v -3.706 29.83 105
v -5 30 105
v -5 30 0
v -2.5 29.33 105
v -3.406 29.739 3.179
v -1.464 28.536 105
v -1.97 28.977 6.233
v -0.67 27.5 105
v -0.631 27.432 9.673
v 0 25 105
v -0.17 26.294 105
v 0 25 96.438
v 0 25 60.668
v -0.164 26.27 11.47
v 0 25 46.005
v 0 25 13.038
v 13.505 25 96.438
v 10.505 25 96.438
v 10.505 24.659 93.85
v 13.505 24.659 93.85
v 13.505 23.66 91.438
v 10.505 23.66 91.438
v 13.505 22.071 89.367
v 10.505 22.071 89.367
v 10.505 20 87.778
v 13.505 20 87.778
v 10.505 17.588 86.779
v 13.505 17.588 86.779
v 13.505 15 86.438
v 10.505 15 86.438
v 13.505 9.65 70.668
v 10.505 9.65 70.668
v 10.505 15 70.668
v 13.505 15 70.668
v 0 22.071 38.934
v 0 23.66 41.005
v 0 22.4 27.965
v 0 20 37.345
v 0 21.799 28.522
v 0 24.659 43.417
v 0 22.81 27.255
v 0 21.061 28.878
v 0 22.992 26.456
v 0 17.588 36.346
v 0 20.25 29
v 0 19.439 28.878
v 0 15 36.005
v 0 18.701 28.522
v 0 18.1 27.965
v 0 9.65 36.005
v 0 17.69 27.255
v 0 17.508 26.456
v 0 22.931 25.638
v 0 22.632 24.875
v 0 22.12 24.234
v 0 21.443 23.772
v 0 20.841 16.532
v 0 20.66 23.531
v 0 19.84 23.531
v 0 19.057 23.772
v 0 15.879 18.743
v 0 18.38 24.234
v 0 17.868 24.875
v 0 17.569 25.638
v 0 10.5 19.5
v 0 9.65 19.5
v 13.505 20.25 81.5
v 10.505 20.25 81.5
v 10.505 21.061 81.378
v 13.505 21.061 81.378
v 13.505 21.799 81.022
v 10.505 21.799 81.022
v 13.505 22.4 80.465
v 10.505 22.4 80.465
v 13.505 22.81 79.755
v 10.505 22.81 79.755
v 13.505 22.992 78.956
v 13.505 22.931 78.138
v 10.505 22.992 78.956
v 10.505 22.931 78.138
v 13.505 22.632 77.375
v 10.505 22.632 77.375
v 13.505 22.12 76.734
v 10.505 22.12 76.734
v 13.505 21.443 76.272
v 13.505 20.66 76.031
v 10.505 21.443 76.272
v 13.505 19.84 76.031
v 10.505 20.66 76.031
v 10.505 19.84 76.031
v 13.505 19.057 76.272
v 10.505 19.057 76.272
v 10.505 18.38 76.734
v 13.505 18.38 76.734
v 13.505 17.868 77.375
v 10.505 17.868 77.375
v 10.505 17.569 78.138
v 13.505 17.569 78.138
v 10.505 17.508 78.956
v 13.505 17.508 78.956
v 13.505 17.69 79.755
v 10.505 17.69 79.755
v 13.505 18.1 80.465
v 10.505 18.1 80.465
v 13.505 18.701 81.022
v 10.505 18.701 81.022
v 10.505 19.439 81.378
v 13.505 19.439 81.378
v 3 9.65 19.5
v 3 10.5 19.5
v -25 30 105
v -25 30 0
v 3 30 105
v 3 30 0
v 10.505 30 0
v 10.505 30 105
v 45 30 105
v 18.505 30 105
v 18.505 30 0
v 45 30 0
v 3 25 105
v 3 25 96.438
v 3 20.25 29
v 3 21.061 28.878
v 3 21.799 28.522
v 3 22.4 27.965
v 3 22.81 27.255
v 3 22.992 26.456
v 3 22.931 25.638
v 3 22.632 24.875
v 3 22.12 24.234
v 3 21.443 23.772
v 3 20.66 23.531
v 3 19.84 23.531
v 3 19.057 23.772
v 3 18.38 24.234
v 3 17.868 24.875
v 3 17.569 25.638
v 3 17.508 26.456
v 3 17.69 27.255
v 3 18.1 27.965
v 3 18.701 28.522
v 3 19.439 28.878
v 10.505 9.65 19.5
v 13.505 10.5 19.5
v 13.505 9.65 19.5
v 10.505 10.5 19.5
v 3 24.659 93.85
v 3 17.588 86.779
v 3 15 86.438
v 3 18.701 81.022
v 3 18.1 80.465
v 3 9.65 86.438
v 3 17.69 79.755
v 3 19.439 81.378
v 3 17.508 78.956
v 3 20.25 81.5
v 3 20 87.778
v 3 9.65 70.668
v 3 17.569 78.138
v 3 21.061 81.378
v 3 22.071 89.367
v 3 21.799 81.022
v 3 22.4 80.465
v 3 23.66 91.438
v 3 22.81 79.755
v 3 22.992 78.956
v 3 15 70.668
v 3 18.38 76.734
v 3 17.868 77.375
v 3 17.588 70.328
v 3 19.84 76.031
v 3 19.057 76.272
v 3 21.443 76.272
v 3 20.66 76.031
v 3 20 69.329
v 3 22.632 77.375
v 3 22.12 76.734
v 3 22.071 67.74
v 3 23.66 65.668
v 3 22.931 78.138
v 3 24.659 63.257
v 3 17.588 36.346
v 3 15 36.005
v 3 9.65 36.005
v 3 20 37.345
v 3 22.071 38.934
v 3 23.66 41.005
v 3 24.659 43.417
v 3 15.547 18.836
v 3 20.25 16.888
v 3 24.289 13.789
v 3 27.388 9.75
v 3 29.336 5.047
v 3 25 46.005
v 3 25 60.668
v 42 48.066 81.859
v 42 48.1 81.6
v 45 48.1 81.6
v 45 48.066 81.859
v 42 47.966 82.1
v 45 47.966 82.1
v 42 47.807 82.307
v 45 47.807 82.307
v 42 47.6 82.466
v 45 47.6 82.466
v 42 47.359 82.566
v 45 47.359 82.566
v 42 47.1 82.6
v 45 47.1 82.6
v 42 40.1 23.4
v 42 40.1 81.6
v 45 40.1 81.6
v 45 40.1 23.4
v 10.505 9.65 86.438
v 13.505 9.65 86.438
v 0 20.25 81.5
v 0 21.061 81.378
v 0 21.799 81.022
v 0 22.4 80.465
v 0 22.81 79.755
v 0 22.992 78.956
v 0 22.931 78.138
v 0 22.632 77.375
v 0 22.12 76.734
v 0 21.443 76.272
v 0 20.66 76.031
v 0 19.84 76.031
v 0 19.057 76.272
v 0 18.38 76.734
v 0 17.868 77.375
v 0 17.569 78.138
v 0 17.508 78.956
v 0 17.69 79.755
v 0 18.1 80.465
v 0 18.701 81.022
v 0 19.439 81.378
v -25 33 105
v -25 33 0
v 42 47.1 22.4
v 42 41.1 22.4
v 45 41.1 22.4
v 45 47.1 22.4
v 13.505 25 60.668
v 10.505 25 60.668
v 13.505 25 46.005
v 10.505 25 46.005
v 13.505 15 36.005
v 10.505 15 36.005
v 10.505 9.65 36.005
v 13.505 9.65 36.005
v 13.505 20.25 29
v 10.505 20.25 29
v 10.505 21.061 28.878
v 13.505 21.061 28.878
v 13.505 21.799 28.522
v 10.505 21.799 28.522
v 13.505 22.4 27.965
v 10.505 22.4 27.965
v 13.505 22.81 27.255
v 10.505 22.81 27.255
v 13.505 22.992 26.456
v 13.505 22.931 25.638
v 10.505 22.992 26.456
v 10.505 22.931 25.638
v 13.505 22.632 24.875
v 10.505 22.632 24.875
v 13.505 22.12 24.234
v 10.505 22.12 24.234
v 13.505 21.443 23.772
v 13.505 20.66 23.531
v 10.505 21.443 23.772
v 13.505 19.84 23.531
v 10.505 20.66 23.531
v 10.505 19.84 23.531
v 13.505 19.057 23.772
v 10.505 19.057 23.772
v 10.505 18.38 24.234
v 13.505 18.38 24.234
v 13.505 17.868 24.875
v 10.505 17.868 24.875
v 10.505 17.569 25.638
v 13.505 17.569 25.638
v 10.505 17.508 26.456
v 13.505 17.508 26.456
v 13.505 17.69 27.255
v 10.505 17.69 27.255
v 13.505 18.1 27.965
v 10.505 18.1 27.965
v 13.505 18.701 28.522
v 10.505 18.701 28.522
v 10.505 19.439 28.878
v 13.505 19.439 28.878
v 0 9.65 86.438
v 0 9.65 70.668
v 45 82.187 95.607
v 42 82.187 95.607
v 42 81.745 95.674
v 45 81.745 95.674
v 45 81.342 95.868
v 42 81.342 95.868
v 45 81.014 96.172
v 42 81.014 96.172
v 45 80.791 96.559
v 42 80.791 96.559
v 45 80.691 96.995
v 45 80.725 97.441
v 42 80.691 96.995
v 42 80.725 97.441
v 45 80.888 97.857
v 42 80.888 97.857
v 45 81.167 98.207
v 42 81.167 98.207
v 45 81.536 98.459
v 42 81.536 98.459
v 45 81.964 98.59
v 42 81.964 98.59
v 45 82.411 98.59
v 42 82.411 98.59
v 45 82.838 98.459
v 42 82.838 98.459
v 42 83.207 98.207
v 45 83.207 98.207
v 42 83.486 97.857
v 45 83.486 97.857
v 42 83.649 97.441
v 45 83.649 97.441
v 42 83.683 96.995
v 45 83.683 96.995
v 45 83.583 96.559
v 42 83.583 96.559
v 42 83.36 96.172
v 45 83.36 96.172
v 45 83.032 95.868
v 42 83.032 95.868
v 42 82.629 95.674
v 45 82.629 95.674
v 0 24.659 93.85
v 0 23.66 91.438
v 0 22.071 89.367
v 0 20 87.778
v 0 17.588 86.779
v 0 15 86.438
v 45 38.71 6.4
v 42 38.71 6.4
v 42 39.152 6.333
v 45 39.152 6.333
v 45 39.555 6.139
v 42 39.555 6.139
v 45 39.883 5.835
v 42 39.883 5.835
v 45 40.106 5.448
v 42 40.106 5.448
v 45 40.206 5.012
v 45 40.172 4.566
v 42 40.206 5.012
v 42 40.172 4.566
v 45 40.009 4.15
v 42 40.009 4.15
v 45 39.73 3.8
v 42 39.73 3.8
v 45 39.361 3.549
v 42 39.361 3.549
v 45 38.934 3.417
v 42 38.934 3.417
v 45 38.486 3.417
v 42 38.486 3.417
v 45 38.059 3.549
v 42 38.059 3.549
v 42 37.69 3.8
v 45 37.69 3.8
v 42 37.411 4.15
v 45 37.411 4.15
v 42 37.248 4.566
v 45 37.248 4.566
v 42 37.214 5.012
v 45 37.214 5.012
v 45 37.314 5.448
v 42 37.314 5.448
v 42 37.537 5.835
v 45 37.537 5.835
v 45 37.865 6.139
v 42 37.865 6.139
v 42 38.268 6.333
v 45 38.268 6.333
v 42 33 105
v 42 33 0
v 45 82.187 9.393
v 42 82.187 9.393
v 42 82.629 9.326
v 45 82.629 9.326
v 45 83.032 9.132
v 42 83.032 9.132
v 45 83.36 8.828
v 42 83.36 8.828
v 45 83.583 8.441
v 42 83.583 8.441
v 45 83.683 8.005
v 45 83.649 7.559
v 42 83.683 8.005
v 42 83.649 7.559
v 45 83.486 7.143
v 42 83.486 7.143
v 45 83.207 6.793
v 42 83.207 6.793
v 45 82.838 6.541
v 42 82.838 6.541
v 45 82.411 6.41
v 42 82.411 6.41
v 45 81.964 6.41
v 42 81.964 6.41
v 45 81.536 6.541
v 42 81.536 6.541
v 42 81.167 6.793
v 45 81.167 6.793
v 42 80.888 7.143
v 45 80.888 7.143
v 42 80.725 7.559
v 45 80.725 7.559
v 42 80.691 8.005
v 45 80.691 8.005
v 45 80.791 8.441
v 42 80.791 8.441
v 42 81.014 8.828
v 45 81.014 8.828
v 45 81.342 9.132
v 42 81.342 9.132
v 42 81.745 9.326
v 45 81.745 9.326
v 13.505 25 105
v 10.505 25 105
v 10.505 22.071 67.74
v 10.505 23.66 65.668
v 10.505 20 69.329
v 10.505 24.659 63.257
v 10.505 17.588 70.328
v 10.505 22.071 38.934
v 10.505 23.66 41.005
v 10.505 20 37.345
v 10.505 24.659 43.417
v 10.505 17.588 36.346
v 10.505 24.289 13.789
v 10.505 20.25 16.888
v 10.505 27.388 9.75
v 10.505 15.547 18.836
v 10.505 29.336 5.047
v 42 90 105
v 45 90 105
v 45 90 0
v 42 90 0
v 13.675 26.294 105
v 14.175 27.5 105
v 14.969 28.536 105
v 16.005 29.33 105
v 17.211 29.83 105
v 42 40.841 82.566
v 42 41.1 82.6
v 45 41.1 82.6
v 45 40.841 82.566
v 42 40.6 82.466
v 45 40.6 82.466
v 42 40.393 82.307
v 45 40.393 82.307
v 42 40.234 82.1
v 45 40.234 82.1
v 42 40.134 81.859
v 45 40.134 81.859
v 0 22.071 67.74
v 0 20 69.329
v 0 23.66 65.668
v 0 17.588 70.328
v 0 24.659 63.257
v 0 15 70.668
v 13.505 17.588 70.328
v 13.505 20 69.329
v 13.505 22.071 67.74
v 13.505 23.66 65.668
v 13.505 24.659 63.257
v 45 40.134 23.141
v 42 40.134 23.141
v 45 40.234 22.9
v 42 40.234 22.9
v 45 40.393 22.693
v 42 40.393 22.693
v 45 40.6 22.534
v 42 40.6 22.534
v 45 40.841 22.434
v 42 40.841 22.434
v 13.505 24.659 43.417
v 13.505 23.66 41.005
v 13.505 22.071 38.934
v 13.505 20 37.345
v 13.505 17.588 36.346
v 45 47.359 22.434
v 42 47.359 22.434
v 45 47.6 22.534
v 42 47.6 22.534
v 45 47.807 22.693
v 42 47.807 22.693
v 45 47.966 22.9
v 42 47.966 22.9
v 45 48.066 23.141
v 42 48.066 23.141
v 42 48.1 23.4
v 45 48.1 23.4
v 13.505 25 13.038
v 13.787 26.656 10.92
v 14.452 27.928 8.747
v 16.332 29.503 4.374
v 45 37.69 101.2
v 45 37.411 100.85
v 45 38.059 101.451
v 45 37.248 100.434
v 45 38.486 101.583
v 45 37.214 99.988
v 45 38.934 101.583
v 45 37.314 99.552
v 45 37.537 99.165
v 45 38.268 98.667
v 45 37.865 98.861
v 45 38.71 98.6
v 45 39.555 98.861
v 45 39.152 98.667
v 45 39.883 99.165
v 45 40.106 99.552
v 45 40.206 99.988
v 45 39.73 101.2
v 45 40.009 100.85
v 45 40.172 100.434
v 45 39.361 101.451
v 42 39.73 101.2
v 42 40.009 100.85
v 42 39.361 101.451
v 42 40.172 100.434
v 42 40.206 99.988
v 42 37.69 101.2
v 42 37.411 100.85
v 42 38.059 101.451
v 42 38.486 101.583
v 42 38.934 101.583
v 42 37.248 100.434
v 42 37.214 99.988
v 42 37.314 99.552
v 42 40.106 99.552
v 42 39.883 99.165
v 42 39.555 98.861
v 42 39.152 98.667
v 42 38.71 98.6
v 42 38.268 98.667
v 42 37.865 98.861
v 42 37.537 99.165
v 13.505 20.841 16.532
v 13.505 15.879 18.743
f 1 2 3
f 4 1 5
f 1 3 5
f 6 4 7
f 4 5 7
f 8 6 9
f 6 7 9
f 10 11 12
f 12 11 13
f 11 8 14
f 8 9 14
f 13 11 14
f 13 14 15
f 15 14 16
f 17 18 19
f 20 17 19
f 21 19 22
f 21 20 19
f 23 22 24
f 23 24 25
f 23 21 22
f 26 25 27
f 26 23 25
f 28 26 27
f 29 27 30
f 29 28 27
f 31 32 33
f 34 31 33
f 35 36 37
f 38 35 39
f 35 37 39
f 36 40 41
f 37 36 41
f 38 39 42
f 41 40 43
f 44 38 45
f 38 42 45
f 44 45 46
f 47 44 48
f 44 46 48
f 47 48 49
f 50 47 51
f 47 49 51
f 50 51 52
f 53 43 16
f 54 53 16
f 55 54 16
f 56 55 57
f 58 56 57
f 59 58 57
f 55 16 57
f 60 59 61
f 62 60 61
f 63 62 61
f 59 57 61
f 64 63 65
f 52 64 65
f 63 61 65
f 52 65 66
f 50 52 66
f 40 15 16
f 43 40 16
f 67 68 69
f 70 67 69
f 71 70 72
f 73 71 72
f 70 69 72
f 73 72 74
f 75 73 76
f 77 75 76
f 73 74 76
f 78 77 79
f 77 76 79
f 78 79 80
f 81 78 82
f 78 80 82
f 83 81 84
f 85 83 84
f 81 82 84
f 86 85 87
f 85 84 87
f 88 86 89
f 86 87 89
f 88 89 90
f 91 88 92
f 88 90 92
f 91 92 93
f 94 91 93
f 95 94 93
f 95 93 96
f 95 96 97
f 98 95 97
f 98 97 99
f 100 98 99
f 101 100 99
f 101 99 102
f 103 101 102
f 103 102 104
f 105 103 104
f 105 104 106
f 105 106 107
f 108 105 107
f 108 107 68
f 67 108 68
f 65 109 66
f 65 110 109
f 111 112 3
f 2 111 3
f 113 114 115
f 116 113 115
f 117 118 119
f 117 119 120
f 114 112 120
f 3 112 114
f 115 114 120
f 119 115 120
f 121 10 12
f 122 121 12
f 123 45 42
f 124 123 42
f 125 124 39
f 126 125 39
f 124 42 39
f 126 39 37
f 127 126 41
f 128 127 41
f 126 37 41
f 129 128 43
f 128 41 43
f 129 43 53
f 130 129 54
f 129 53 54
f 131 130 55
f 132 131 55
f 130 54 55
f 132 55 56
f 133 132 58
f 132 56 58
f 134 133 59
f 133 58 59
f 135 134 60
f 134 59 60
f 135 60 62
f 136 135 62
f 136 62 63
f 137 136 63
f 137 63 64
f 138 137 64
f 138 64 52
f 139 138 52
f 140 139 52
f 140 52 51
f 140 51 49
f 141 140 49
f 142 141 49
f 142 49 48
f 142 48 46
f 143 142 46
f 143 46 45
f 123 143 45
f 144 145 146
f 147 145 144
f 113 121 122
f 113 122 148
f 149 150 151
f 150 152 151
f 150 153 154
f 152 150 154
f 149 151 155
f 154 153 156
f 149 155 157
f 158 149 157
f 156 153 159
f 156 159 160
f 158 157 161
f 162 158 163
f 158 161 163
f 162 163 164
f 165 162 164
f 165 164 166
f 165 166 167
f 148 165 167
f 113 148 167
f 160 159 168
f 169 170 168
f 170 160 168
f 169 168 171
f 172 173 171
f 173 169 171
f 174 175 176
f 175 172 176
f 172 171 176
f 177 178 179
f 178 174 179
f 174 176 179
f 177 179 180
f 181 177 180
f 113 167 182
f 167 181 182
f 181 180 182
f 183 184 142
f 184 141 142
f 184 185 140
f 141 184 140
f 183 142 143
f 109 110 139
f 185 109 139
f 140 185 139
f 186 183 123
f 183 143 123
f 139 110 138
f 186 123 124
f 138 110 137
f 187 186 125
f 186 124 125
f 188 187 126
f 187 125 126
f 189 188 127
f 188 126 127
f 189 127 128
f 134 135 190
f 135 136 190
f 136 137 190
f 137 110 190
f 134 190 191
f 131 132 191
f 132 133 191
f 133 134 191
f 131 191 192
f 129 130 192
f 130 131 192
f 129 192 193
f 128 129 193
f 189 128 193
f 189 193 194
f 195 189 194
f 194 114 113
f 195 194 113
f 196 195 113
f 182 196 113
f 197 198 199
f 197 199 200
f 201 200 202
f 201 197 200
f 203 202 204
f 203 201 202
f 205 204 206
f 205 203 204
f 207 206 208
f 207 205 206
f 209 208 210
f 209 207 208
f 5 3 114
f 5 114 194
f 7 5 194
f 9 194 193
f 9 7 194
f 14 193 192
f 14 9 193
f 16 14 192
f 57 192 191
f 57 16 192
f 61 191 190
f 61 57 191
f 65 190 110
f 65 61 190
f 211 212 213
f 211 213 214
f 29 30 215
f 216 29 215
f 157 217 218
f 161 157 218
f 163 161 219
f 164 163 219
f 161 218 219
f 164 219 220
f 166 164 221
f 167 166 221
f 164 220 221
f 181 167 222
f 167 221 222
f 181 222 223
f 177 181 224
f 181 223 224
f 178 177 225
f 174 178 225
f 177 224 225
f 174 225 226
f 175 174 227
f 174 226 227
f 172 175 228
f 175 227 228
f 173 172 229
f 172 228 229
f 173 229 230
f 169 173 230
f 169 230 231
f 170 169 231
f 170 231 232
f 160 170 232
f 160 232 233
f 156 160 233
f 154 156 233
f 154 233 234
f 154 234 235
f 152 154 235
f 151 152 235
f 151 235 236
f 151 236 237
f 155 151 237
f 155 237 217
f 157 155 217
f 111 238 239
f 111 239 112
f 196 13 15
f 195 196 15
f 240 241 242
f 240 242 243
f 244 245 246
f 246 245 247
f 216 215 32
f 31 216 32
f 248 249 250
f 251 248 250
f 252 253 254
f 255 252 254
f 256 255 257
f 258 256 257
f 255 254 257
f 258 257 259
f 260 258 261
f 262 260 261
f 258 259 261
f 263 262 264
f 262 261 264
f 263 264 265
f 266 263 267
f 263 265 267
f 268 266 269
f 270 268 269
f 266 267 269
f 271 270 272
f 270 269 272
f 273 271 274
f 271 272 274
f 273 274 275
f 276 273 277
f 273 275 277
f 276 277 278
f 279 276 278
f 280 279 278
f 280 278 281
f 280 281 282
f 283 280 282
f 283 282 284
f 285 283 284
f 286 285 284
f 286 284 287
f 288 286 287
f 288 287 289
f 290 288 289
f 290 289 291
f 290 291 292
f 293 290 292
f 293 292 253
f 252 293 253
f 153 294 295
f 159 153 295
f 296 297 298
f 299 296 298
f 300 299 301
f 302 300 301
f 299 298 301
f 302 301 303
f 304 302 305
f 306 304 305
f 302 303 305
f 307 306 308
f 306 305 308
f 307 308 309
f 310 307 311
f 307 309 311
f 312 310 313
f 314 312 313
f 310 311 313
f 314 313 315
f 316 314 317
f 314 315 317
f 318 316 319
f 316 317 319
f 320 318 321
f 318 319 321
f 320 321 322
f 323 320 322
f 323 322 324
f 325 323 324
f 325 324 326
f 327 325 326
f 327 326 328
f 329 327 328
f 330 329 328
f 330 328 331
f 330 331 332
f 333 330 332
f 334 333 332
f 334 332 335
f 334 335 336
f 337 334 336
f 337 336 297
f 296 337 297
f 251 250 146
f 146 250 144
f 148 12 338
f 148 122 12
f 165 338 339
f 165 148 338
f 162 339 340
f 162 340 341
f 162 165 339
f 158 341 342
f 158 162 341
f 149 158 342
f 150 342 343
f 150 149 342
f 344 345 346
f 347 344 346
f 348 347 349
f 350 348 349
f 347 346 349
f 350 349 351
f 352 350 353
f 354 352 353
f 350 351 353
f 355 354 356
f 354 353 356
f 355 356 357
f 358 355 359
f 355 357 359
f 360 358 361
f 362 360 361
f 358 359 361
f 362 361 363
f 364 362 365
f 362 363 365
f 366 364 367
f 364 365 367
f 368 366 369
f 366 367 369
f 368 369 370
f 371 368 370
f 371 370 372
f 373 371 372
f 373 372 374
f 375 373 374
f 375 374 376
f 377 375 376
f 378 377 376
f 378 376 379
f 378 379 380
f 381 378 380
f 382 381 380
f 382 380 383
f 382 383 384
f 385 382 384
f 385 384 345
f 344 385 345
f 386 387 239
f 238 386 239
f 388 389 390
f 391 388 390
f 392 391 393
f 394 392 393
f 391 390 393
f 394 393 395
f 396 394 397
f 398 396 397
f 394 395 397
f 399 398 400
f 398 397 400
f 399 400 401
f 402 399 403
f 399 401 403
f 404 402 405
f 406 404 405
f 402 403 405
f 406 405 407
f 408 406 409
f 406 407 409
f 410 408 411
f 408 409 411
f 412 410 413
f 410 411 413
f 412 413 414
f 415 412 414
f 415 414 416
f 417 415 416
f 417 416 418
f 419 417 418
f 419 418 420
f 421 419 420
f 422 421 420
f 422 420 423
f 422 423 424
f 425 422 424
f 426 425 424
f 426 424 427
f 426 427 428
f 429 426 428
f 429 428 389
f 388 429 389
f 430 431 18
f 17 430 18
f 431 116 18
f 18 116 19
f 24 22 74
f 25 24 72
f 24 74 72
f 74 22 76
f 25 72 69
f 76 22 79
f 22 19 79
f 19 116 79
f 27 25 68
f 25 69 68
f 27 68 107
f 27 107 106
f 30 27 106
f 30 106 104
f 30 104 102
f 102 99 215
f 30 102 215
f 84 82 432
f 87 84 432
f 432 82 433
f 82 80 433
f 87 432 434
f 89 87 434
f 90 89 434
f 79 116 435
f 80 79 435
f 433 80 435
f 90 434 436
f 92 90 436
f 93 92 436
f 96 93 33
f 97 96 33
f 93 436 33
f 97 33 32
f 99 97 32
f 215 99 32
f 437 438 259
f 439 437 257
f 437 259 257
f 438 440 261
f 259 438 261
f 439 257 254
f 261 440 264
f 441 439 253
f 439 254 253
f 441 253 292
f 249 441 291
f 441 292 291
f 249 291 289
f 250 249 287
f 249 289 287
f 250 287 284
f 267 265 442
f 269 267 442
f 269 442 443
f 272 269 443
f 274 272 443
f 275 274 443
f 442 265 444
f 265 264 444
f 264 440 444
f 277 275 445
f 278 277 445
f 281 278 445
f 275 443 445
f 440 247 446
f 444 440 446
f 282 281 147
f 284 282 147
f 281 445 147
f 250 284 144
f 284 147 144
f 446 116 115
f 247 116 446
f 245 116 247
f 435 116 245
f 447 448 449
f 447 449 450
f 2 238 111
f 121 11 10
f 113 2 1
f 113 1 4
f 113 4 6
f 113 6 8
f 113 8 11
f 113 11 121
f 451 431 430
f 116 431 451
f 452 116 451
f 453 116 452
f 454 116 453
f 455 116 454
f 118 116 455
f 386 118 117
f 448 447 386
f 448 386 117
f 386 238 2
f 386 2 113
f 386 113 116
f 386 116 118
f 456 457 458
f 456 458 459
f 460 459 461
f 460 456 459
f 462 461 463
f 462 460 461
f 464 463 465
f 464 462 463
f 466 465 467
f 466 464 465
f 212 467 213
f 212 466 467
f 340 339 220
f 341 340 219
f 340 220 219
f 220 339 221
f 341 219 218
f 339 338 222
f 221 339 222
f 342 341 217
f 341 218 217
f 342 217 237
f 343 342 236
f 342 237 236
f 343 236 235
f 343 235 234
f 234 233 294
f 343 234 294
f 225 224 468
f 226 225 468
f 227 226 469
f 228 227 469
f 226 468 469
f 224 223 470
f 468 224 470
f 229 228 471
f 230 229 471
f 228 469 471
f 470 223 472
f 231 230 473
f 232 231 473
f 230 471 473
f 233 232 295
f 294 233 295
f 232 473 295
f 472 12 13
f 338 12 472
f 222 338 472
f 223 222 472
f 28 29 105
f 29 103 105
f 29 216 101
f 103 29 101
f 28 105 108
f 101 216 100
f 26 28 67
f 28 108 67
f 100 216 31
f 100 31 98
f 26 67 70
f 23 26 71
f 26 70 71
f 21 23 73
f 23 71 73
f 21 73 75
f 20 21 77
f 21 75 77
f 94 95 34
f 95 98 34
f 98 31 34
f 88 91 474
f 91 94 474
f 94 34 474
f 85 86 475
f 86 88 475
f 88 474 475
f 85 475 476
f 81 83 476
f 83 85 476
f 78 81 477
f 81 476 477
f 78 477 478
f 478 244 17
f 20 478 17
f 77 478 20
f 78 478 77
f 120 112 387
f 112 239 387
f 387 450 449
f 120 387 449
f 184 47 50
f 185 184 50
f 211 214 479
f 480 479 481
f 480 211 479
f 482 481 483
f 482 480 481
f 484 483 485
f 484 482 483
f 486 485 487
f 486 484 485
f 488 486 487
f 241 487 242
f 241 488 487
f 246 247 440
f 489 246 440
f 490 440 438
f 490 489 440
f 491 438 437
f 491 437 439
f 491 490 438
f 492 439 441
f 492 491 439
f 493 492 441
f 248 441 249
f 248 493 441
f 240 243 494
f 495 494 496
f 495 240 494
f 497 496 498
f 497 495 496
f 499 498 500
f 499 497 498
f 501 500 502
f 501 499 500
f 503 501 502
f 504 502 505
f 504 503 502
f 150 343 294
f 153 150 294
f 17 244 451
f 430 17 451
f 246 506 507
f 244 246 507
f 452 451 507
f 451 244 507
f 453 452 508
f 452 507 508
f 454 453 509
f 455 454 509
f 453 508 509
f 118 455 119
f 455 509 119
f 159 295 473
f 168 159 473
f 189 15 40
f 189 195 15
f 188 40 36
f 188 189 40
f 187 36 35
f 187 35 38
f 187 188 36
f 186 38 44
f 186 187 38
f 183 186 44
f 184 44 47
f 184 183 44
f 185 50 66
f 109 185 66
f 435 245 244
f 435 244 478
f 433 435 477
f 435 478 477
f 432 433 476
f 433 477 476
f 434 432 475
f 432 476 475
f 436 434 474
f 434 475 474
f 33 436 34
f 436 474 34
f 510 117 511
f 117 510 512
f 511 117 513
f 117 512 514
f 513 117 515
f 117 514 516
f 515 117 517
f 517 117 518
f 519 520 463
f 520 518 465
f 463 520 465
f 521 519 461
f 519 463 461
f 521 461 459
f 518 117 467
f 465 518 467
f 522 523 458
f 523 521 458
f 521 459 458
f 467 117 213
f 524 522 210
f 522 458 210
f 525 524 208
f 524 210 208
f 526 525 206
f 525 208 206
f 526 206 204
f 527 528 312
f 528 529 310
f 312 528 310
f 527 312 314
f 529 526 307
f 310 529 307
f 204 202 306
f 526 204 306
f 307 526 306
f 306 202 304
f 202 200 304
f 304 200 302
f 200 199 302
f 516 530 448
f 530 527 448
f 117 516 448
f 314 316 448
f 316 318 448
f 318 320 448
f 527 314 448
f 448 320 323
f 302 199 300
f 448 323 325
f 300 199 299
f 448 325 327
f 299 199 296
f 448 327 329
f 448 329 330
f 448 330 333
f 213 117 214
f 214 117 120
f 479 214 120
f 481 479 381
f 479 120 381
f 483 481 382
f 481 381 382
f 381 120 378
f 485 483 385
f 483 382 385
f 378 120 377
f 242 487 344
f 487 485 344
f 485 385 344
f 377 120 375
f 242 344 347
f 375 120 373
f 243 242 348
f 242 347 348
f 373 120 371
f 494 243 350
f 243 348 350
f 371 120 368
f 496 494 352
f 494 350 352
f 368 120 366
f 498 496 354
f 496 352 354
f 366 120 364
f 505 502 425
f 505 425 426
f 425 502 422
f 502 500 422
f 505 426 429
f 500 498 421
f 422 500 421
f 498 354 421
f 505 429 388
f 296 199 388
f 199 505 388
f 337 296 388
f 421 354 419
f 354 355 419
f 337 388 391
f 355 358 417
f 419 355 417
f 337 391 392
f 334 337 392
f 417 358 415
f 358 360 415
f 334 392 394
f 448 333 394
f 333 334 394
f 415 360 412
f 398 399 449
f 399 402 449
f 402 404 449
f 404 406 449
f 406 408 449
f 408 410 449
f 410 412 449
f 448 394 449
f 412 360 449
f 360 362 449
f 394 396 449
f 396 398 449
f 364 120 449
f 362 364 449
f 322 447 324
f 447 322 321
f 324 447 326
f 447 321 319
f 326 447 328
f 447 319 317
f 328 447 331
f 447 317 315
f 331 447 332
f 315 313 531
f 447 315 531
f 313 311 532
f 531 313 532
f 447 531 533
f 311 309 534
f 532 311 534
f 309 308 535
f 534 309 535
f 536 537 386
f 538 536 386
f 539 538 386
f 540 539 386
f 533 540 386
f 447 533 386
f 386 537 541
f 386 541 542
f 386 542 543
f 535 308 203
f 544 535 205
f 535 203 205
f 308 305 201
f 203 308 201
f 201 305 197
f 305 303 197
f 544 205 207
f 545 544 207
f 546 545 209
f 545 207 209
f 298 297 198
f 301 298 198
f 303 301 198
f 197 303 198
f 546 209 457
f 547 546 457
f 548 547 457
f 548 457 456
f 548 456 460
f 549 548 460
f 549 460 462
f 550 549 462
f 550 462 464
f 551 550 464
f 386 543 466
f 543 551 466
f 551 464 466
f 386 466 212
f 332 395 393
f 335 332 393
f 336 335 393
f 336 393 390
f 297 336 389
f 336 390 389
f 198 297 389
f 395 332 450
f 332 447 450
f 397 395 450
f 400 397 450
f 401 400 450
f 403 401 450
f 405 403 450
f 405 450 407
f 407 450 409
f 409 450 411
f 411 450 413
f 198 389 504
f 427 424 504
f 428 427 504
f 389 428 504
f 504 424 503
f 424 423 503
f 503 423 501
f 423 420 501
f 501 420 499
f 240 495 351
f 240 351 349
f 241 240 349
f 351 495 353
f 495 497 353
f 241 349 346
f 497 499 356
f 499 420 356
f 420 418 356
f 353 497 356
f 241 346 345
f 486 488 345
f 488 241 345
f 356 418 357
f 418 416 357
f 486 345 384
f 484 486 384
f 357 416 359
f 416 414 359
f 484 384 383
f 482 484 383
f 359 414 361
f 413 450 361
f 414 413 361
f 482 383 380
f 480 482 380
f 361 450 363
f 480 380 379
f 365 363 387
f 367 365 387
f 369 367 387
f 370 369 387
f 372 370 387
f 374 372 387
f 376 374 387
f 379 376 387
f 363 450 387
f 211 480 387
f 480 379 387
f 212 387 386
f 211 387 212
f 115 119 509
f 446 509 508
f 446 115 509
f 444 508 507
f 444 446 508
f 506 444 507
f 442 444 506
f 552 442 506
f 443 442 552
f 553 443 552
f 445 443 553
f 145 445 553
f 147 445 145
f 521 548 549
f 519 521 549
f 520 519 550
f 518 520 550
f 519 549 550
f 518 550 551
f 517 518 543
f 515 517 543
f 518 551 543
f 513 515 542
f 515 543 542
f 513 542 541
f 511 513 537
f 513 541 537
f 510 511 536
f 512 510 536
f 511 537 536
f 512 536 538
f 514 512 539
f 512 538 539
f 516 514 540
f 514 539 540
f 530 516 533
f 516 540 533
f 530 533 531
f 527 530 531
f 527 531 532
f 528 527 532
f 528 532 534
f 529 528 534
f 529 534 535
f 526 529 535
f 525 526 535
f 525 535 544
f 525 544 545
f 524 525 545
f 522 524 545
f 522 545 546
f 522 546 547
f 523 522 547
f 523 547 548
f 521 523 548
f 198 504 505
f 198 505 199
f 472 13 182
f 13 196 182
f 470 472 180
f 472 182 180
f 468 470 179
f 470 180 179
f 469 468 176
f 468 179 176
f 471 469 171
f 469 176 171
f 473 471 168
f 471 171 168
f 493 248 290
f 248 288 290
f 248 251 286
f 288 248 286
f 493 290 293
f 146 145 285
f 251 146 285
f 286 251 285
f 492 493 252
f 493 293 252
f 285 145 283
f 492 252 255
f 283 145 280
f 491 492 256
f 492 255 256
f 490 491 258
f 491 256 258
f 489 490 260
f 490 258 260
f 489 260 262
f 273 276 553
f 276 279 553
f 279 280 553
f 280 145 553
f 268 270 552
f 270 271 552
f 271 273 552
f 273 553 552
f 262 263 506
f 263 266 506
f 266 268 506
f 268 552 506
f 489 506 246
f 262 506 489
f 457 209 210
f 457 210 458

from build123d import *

# Parameters (mm, degrees)
BOSS_EXTRUDE1_DEPTH = 105
SKETCH3_R           = 2.75
CUT_EXTRUDE1_DEPTH  = 146.430395722
SKETCH5_R           = 1.5
CUT_EXTRUDE2_DEPTH  = 154.668474321
SKETCH7_W           = 24.871294837
SKETCH7_H           = 30
CUT_EXTRUDE5_DEPTH  = 19.5
FILLET1_R           = 19.5
CUT_EXTRUDE6_DEPTH  = 154.668474389
CUT_EXTRUDE8_DEPTH  = 146.430395795
FILLET2_R           = 10


with BuildPart() as part:
    # Sketch2 → Boss-Extrude1 (new body)
    with BuildSketch(Plane.XY):
        with BuildLine():
            Line((18.505, 30), (45, 30))
            Line((45, 30), (45, 90))
            Line((45, 90), (42, 90))
            Line((42, 90), (42, 33))
            Line((42, 33), (0, 33))
            Line((0, 33), (-25, 33))
            Line((-25, 33), (-25, 30))
            Line((-25, 30), (-5, 30))
            ThreePointArc((-5, 30), (-1.464466094, 28.535533906), (0, 25))
            Line((0, 25), (0, 0))
            Line((0, 0), (3, 0))
            Line((3, 0), (3, 30))
            Line((3, 30), (10.505, 30))
            Line((10.505, 30), (10.505, 0))
            Line((10.505, 0), (13.505, 0))
            Line((13.505, 0), (13.505, 25))
            ThreePointArc((13.505, 25), (14.969466094, 28.535533906), (18.505, 30))
        make_face()
    extrude(amount=BOSS_EXTRUDE1_DEPTH)

    # Sketch3 → Cut-Extrude1 (cut, through all)
    with BuildSketch(Plane.ZY):
        with Locations((26.25, 20.25)):
            Circle(SKETCH3_R)
        with Locations((78.75, 20.25)):
            Circle(SKETCH3_R)
    extrude(amount=-CUT_EXTRUDE1_DEPTH, mode=Mode.SUBTRACT)

    # Sketch5 → Cut-Extrude2 (cut, through all)
    with BuildSketch(Plane.ZY.offset(-42)):
        with Locations((4.9, 38.71)):
            Circle(SKETCH5_R)
        with Locations(Location((100.1, 38.71, 0), (0, 0, 180))):
            Circle(SKETCH5_R)
        with Locations((7.892916969, 82.187107172)):
            Circle(SKETCH5_R)
        with Locations(Location((97.107083031, 82.187107172, 0), (0, 0, 180))):
            Circle(SKETCH5_R)
    extrude(amount=-CUT_EXTRUDE2_DEPTH, mode=Mode.SUBTRACT)

    # Sketch7 → Cut-Extrude5 (cut)
    with BuildSketch(Plane(origin=(0, 0, 0), x_dir=(-1, 0, 0), z_dir=(0, 0, -1))):
        with Locations((-6.069352582, 15)):
            Rectangle(SKETCH7_W, SKETCH7_H)
    extrude(amount=-CUT_EXTRUDE5_DEPTH, mode=Mode.SUBTRACT)

    # Fillet1
    fillet1_edges = [part.edges().sort_by_distance(p)[0] for p in [
        (-1, 30, 19.5),
        (14.505, 30, 19.5),
    ]]
    fillet(fillet1_edges, radius=FILLET1_R - 0.0001)  # a hair under: the kernel refuses the full size

    # Sketch9 → Cut-Extrude6 (cut, through all)
    with BuildSketch(Plane.ZY.offset(-42)):
        with BuildLine():
            Line((23.4, 48.1), (81.6, 48.1))
            ThreePointArc((81.6, 48.1), (82.307106781, 47.807106781), (82.6, 47.1))
            Line((82.6, 47.1), (82.6, 41.1))
            ThreePointArc((82.6, 41.1), (82.307106781, 40.392893219), (81.6, 40.1))
            Line((81.6, 40.1), (23.4, 40.1))
            ThreePointArc((23.4, 40.1), (22.692893219, 40.392893219), (22.4, 41.1))
            Line((22.4, 41.1), (22.4, 47.1))
            ThreePointArc((22.4, 47.1), (22.692893219, 47.807106781), (23.4, 48.1))
        make_face()
    extrude(amount=-CUT_EXTRUDE6_DEPTH, mode=Mode.SUBTRACT)

    # Sketch10 → Cut-Extrude8 (cut, through all)
    with BuildSketch(Plane.ZY):
        Polygon((19.5, 0), (36.004964036, 0), (70.668478518, 0), (86.438146051, 0), (105, 0), (105, 9.649634618), (105, 25), (86.438146051, 25), (86.438146051, 9.649634618), (70.668478518, 9.649634618), (70.668478518, 25), (36.004964036, 25), (36.004964036, 9.649634618), (19.5, 9.649634618), align=None)
    extrude(amount=-CUT_EXTRUDE8_DEPTH, mode=Mode.SUBTRACT)

    # Fillet2
    fillet2_edges = [part.edges().sort_by_distance(p)[0] for p in [
        (1.5, 25, 36.004964036),
        (12.005, 25, 36.004964036),
        (1.5, 25, 70.668478518),
        (12.005, 25, 70.668478518),
        (1.5, 25, 86.438146051),
        (12.005, 25, 86.438146051),
    ]]
    fillet(fillet2_edges, radius=FILLET2_R)


solid = part.part
